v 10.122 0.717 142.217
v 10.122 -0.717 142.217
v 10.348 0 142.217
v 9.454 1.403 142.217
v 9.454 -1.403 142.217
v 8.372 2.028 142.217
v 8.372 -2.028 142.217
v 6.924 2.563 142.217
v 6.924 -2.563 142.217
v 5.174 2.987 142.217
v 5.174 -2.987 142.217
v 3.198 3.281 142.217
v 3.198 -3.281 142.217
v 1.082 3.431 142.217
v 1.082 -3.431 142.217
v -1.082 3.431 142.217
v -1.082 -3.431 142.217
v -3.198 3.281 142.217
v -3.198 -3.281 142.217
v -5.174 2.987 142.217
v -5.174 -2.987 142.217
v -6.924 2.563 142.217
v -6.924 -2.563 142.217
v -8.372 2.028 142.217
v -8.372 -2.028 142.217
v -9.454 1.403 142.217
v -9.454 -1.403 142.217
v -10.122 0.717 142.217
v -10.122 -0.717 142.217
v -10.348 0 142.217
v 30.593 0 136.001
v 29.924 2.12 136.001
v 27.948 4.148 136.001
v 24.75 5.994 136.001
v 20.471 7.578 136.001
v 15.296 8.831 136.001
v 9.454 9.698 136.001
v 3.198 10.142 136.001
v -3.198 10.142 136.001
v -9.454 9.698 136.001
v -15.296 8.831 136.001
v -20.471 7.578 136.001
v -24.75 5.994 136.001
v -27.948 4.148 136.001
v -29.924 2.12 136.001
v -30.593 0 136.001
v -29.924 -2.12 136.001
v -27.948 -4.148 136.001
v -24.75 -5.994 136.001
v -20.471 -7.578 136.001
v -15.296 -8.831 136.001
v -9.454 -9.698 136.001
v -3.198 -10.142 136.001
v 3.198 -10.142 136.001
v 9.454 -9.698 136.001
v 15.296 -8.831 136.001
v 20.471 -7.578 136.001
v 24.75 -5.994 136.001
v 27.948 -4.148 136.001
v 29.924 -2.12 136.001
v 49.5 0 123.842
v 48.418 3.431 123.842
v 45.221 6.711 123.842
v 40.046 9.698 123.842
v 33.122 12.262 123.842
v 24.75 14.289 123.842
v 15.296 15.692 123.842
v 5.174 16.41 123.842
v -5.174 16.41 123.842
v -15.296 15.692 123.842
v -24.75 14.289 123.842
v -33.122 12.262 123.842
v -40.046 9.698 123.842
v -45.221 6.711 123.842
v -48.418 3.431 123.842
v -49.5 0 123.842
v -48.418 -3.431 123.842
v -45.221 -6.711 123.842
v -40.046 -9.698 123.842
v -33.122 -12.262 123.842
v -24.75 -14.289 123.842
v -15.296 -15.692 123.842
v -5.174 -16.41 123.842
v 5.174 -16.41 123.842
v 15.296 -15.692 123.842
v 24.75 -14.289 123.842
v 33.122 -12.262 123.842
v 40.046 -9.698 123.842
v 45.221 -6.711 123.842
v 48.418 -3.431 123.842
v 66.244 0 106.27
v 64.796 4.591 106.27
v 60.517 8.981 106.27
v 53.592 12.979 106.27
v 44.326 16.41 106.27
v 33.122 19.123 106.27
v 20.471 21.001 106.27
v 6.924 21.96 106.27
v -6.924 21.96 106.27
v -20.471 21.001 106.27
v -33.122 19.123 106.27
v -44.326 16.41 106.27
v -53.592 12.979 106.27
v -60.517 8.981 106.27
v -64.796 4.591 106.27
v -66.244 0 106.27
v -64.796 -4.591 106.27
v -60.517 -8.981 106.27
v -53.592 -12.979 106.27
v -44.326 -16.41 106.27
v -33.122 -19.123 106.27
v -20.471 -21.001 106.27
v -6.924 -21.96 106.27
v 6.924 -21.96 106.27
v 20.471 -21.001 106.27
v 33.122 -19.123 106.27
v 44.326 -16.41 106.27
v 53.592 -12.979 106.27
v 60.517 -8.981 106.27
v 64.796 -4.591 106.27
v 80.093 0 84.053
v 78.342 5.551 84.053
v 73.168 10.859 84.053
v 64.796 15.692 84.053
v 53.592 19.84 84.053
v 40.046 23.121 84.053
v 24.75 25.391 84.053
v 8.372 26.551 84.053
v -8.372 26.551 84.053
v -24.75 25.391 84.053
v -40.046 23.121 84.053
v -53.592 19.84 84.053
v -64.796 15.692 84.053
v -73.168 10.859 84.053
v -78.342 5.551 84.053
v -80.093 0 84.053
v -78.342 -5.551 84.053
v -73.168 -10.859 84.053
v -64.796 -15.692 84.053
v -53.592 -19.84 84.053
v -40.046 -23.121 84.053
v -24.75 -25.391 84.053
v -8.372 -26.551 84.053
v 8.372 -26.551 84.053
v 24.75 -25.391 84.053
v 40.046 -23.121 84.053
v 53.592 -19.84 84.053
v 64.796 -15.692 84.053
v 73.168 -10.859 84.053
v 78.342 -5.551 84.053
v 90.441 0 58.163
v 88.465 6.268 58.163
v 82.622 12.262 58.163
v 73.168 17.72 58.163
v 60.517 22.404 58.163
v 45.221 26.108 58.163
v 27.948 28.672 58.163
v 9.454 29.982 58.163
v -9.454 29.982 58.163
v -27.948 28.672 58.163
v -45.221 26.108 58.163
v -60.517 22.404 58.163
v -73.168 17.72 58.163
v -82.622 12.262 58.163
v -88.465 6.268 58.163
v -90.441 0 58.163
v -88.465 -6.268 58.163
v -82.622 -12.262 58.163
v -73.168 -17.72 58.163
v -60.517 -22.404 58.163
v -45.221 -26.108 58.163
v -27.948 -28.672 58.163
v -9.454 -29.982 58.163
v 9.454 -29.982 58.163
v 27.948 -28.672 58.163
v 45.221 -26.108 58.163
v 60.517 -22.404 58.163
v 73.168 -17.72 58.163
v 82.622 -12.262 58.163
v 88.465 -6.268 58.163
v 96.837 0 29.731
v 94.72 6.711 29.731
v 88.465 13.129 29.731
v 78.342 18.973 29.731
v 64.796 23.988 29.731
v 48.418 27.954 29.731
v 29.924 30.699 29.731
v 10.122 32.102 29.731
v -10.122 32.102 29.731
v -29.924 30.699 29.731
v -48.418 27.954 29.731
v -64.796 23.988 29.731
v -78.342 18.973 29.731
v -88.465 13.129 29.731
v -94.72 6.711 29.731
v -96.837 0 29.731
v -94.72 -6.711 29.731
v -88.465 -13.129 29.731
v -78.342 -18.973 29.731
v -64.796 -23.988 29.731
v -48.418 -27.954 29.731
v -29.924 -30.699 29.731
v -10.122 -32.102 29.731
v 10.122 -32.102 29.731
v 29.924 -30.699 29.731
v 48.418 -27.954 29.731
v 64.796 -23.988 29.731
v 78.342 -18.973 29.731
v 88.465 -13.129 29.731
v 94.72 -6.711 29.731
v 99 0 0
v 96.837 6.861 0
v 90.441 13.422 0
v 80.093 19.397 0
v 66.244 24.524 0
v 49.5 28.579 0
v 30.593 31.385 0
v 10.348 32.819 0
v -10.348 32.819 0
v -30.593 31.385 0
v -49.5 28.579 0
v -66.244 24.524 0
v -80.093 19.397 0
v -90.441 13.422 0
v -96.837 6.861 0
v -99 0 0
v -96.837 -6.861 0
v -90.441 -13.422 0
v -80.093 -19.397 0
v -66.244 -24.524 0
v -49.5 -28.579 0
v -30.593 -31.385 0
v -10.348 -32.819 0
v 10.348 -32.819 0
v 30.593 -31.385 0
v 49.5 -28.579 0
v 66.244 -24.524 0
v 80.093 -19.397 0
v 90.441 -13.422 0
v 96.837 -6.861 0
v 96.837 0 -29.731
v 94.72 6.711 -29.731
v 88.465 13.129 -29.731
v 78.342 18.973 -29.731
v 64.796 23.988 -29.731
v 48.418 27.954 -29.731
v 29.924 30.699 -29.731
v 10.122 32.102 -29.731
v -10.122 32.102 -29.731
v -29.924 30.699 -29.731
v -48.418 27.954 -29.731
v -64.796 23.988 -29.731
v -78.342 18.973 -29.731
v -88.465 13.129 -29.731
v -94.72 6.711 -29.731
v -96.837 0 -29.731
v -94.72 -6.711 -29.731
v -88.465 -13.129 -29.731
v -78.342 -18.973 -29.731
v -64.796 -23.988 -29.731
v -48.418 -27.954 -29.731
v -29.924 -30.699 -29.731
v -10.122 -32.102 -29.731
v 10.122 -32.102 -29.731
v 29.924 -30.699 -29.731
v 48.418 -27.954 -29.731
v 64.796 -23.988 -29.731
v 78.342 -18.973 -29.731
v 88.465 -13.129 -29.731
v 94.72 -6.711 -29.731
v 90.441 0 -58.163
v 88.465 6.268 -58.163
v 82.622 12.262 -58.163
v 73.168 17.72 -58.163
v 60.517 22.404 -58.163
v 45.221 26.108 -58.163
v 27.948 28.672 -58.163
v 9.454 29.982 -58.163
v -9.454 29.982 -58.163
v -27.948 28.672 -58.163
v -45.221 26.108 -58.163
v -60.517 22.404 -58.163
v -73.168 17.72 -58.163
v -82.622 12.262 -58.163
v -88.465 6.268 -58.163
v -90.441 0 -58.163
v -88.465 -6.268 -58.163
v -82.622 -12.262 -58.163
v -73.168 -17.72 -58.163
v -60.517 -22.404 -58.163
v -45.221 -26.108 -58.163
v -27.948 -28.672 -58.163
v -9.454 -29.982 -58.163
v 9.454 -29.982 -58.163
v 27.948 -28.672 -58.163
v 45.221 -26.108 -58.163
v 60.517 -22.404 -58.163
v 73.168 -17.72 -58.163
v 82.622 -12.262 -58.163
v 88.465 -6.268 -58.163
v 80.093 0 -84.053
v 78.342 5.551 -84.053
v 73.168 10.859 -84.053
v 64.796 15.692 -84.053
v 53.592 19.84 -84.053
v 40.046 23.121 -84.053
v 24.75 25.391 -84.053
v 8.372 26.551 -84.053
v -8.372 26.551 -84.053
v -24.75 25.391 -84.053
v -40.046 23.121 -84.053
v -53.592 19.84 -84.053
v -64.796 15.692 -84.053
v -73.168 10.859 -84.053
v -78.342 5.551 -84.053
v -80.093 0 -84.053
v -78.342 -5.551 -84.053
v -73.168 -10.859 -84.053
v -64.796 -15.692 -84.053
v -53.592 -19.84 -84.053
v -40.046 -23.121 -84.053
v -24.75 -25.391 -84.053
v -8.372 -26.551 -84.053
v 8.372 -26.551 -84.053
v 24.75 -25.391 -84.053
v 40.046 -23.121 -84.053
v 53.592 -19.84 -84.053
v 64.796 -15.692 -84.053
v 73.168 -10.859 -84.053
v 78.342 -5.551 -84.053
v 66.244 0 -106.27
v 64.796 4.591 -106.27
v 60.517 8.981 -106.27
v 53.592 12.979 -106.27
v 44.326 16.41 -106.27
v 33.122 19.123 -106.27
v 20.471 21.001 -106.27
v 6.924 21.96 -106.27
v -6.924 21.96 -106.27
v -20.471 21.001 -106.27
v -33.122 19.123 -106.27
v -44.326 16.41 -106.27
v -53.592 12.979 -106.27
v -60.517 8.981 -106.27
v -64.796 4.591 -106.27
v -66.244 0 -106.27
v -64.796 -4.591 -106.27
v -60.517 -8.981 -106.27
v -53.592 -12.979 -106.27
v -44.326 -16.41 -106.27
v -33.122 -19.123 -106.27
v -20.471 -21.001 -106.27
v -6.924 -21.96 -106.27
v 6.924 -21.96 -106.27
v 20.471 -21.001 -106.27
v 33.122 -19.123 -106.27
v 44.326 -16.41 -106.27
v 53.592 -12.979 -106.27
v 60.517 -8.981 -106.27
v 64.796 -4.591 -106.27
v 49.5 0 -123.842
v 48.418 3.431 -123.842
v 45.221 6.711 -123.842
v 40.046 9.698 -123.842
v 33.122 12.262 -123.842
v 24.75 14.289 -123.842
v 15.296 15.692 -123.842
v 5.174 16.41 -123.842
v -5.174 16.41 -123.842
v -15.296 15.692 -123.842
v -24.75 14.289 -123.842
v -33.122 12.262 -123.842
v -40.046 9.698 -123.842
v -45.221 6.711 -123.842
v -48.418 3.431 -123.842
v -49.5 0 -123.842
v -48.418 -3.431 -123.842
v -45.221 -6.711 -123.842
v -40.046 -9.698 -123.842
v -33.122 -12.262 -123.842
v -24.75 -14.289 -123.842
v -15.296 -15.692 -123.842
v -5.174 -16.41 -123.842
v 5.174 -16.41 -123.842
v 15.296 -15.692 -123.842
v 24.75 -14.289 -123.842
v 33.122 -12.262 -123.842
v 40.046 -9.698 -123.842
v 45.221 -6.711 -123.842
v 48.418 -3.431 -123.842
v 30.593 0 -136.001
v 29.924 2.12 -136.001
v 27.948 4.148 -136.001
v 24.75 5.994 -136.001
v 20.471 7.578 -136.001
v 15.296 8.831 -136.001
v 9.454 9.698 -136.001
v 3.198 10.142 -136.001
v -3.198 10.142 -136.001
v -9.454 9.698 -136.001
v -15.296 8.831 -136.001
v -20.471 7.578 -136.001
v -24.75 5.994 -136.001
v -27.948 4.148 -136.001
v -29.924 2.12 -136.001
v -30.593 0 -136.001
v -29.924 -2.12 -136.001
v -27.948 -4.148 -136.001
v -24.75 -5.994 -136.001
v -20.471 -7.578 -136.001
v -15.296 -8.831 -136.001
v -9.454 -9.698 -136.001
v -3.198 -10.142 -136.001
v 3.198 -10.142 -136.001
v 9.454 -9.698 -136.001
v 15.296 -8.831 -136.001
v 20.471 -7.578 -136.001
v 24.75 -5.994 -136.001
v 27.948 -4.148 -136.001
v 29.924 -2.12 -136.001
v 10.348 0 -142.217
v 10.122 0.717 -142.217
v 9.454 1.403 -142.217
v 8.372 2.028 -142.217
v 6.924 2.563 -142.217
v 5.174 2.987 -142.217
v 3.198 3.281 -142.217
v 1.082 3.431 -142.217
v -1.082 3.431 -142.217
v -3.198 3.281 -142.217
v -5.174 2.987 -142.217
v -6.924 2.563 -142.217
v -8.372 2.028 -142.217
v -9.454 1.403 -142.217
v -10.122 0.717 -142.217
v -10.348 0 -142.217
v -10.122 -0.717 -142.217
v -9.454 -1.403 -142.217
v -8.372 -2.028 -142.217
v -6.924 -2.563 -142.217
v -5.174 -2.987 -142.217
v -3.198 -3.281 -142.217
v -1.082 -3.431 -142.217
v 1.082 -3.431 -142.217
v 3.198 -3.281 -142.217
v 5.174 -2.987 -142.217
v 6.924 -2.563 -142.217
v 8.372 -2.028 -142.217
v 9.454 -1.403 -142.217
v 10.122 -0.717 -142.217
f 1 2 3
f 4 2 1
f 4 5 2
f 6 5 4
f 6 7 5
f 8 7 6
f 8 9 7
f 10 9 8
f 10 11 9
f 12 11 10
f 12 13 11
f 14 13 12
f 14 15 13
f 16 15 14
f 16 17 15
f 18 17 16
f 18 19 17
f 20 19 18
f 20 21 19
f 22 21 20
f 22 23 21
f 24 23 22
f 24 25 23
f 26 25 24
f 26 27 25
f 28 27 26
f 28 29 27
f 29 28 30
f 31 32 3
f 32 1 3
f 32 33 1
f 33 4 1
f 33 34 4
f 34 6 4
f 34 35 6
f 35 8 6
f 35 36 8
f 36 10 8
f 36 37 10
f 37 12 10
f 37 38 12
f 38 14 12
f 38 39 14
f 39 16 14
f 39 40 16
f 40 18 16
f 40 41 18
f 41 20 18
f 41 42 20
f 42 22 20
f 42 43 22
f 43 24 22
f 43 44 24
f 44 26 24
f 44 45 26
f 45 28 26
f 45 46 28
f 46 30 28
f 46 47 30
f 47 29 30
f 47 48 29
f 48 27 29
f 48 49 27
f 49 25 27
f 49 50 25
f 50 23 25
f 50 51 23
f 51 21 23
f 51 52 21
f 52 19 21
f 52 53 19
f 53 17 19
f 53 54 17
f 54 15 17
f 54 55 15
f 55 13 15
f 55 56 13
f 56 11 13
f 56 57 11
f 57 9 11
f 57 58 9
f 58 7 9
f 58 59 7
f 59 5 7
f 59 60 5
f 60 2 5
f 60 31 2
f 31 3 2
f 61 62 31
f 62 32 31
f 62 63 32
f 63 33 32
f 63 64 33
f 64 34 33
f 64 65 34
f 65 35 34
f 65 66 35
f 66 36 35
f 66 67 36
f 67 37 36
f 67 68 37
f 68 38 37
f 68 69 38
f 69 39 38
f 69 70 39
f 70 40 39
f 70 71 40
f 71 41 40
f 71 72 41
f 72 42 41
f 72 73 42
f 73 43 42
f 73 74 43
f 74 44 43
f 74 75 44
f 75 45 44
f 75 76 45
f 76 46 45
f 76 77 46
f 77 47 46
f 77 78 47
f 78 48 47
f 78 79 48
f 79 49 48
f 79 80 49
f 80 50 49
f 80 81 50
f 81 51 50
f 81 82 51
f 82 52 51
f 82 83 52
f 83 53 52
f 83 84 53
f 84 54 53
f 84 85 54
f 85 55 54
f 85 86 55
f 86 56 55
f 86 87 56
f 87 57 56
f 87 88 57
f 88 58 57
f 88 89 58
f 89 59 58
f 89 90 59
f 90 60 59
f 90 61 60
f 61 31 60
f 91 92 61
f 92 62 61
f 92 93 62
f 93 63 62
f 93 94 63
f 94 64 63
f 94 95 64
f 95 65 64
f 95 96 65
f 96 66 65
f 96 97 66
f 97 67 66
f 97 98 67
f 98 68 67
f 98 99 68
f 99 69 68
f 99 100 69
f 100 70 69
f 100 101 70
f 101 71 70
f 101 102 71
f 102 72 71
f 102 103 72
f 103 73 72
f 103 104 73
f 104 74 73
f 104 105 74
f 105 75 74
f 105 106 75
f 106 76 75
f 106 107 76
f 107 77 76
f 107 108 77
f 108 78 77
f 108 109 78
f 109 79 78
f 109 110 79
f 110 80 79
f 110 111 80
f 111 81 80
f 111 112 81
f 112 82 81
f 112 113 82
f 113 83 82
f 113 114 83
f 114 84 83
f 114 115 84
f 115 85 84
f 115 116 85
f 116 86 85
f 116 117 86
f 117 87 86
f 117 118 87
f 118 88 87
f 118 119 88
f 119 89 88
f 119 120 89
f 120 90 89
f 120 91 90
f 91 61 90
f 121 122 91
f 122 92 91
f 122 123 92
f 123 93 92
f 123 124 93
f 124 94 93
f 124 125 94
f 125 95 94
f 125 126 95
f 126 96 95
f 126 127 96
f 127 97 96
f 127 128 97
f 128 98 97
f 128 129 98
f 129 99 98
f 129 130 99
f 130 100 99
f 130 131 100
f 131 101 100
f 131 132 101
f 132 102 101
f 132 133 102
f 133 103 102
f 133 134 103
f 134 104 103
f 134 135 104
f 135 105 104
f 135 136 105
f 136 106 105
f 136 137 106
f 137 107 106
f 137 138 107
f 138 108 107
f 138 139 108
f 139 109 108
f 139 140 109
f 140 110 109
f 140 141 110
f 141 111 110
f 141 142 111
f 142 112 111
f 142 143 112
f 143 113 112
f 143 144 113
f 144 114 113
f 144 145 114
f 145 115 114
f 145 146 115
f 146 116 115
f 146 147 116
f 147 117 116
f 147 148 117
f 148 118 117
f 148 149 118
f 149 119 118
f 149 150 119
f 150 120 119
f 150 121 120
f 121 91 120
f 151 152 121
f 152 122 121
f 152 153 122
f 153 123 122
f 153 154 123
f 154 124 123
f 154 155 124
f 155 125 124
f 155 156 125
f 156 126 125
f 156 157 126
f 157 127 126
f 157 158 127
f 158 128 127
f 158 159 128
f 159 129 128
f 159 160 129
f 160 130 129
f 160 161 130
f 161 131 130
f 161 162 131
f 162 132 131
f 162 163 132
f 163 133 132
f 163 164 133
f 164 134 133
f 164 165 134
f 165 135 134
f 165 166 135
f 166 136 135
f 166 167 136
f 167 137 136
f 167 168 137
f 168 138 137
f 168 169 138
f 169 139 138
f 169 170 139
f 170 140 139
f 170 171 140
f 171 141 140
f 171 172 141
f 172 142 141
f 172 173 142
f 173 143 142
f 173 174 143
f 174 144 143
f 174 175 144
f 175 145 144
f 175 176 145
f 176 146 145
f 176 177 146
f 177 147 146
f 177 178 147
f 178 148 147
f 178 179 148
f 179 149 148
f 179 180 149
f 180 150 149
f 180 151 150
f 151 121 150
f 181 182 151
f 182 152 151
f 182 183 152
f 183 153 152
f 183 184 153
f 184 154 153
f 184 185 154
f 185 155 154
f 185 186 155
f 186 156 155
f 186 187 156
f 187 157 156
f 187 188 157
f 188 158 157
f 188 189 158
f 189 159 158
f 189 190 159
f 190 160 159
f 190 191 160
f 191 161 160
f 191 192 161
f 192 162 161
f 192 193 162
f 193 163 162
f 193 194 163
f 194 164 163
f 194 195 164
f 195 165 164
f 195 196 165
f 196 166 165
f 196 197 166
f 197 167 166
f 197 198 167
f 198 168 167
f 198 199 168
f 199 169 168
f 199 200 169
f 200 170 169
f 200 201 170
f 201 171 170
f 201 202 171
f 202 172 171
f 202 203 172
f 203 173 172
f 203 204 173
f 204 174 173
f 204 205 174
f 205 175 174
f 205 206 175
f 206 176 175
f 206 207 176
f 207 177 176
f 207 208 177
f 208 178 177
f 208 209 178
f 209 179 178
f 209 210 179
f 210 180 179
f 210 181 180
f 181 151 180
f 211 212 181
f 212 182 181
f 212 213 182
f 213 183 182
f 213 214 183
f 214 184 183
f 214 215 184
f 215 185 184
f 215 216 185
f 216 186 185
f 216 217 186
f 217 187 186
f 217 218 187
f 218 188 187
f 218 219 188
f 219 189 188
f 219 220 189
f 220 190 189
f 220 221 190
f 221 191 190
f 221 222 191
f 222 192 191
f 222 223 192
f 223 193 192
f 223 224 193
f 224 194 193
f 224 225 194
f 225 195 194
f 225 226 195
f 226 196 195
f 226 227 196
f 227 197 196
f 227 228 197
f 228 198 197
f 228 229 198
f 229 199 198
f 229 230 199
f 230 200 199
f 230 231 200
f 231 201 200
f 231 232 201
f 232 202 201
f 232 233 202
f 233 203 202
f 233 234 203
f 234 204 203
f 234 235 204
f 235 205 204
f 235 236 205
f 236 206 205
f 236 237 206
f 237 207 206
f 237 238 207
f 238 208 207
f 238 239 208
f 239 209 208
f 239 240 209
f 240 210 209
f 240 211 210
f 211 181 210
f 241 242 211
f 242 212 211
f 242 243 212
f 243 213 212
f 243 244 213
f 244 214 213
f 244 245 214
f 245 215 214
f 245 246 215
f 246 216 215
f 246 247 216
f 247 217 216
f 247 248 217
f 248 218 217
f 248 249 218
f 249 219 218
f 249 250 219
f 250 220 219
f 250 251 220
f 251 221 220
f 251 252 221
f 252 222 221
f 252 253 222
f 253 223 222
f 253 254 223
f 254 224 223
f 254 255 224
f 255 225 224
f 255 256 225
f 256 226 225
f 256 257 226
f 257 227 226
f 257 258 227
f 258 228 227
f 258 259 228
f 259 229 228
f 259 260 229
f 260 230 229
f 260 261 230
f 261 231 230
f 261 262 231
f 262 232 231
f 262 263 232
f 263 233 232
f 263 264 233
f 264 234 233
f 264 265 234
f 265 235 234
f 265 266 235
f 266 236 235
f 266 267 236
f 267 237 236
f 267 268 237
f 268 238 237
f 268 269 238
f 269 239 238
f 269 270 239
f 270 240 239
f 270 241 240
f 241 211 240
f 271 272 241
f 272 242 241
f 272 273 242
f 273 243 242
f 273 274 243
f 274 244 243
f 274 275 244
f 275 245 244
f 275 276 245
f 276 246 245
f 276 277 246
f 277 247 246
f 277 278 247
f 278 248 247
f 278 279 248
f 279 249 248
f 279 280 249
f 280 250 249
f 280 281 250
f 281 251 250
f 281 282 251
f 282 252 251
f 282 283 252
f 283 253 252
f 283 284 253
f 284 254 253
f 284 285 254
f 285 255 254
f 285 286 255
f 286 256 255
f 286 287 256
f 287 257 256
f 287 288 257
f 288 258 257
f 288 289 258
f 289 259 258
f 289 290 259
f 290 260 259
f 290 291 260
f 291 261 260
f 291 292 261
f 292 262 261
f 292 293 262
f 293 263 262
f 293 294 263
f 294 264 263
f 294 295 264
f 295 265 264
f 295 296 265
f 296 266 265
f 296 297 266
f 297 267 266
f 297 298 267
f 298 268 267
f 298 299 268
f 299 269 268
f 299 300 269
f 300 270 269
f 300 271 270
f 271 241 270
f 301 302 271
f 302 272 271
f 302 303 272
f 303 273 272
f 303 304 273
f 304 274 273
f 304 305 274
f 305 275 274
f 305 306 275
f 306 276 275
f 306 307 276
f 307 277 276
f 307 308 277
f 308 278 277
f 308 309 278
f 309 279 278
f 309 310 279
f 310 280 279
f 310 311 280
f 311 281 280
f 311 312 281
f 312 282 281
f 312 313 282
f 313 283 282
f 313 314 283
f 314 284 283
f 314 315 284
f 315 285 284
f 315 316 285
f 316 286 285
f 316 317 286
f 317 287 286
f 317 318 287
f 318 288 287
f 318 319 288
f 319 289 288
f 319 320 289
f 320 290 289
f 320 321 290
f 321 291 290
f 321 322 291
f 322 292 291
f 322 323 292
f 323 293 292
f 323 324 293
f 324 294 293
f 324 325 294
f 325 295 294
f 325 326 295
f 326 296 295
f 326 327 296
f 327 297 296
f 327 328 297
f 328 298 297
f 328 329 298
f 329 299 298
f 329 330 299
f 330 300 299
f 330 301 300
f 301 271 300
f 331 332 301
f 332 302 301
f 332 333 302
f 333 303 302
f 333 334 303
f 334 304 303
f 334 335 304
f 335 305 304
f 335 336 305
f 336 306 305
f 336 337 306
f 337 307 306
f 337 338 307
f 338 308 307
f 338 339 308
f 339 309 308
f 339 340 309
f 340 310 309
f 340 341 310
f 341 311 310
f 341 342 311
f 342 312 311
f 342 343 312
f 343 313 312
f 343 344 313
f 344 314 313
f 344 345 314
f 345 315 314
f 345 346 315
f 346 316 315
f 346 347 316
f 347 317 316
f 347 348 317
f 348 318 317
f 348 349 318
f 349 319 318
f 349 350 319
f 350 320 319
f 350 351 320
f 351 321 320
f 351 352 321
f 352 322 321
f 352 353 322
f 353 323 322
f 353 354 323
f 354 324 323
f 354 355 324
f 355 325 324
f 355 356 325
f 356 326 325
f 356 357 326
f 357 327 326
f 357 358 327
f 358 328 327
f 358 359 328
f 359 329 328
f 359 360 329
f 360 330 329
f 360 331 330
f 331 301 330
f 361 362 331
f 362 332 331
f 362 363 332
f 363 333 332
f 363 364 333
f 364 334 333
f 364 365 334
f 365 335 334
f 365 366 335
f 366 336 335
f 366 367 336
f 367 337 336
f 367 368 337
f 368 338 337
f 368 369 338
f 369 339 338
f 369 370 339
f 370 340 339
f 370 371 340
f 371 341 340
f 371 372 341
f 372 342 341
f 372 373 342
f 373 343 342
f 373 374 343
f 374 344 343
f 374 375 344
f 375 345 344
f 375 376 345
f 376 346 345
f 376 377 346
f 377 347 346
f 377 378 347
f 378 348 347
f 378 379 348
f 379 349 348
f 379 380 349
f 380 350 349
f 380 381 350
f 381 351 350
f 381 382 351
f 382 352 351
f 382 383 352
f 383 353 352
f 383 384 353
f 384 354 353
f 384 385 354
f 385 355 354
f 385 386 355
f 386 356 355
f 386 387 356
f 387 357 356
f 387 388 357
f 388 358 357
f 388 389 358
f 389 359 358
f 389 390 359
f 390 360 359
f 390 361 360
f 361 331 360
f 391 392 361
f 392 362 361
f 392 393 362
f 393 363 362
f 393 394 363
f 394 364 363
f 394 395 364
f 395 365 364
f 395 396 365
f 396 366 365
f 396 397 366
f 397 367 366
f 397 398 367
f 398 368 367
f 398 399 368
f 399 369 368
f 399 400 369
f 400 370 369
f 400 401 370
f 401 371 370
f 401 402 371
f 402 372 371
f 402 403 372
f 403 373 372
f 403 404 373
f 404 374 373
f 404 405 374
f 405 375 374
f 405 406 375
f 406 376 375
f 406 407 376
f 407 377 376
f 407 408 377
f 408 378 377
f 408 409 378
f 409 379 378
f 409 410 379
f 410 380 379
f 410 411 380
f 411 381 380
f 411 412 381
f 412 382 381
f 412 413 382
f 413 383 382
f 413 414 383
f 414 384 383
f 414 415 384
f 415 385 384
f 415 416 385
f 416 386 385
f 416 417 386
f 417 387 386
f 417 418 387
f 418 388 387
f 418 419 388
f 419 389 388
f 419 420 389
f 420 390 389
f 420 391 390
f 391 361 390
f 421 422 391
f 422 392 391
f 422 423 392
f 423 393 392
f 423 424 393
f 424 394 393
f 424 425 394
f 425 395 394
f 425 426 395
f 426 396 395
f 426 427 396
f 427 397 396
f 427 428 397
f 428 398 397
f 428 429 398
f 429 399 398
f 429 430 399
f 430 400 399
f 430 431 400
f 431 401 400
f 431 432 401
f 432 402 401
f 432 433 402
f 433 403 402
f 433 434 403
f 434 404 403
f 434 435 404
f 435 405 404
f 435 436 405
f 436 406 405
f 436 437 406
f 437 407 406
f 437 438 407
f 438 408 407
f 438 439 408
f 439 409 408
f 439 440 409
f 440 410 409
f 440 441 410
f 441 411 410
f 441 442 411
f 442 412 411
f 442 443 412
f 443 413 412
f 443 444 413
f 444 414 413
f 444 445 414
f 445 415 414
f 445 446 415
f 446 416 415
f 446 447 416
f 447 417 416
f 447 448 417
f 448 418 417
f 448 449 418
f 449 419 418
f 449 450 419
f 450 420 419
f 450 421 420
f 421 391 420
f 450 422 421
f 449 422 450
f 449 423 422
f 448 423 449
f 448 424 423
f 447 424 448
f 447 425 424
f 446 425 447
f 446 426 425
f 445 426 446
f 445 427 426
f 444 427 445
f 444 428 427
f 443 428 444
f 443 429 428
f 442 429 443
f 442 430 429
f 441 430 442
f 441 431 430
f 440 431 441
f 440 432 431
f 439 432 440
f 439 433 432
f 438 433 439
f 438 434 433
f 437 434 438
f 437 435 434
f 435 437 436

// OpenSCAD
// Generated by SolidPython 1.0.1 on 2020-07-29 00:46:48


scale(v = [9, 3, 13]) {
	sphere(r = 11);
}
/***********************************************
*********      SolidPython code:      **********
************************************************
 
# import packages: SolidPython
from solid import *
from solid.utils import *
from itertools import chain, combinations, permutations


class Resize:

    def __init__(self, scad_file):
        self.scad_file = scad_file
        #self.scad_file = import_scad(scad_file)
        # cone/cylinder param:
        self.r1 = 0
        self.r2 = 0
        self.h = 0
        # rectangular prism param:
        self.w = 0
        self.l = 0
        # ellipse param:
        self.r = 0

    # import OpenScad code (file name corresponds to shape)


    # classify shape + parameters
    def assign(self, param1, param2, param3):
        if self.scad_file == 'cone.scad':
            self.r1 = param1
            self.r2 = param2
            self.h = param3
        elif self.scad_file == 'cylinder.scad':
            self.r1 = param1
            self.r2 = param2
            self.h = param3
        elif self.scad_file == 'rectangularPrism.scad':
            self.h = param1
            self.l = param2
            self.w = param3
        else:
            self.r = param1
            self.h = param2

    # resize parameters
    def iterate(self):
        x = range(3, 20, 2)
        i = 1
        if self.scad_file == 'cone.scad':
            tempList = list(permutations(x, 2))
            for temp in tempList:
                param1 = temp[0]
                param2 = temp[1]
                filepath = 'produced_scad_files/' + 'cone' + str(param1) + '_' + str(param2) + '_' + '.scad'
                scad_render_to_file(cylinder(h=param1, r1=param2, r2=0), filepath)

        elif self.scad_file == 'cylinder.scad':
            tempList = list(permutations(x, 3))
            for temp in tempList:
                param1 = temp[0]
                param2 = temp[1]
                filepath = 'produced_scad_files/' + 'cylinder' + str(param1) + '_' + str(param2) + '_' + '.scad'
                scad_render_to_file(cylinder(h=param1, r1=param2, r2=param2), filepath)

        elif self.scad_file == 'rectangularPrism.scad':
            tempList = list(permutations(x, 3))
            for temp in tempList:
                param1 = temp[0]
                param2 = temp[1]
                param3 = temp[2]
                filepath = 'produced_scad_files/' + 'rectangularPrism' + str(param1) + '_' + str(param2) + '_' + str(
                    param3) + '.scad'
                scad_render_to_file(cube(size=(param1, param2, param3)), filepath)

        elif self.scad_file == 'ellipse.scad':
            tempList = list(permutations(x, 4))
            for temp in tempList:
                param1 = temp[0]
                param2 = temp[1]
                param3 = temp[2]
                param4 = temp[3]
                filepath = 'produced_scad_files/' + 'ellipse' + str(param1) + '_' + str(param2) + '_' + str(param3) + '_' + str(param4) + '.scad'
                scad_render_to_file(scale([param1, param2, param3])(sphere(r=param4)), filepath)

    def render_to_scadfile(self):
        scad_render_to_file(scad, 'example.scad') 
 
************************************************/
